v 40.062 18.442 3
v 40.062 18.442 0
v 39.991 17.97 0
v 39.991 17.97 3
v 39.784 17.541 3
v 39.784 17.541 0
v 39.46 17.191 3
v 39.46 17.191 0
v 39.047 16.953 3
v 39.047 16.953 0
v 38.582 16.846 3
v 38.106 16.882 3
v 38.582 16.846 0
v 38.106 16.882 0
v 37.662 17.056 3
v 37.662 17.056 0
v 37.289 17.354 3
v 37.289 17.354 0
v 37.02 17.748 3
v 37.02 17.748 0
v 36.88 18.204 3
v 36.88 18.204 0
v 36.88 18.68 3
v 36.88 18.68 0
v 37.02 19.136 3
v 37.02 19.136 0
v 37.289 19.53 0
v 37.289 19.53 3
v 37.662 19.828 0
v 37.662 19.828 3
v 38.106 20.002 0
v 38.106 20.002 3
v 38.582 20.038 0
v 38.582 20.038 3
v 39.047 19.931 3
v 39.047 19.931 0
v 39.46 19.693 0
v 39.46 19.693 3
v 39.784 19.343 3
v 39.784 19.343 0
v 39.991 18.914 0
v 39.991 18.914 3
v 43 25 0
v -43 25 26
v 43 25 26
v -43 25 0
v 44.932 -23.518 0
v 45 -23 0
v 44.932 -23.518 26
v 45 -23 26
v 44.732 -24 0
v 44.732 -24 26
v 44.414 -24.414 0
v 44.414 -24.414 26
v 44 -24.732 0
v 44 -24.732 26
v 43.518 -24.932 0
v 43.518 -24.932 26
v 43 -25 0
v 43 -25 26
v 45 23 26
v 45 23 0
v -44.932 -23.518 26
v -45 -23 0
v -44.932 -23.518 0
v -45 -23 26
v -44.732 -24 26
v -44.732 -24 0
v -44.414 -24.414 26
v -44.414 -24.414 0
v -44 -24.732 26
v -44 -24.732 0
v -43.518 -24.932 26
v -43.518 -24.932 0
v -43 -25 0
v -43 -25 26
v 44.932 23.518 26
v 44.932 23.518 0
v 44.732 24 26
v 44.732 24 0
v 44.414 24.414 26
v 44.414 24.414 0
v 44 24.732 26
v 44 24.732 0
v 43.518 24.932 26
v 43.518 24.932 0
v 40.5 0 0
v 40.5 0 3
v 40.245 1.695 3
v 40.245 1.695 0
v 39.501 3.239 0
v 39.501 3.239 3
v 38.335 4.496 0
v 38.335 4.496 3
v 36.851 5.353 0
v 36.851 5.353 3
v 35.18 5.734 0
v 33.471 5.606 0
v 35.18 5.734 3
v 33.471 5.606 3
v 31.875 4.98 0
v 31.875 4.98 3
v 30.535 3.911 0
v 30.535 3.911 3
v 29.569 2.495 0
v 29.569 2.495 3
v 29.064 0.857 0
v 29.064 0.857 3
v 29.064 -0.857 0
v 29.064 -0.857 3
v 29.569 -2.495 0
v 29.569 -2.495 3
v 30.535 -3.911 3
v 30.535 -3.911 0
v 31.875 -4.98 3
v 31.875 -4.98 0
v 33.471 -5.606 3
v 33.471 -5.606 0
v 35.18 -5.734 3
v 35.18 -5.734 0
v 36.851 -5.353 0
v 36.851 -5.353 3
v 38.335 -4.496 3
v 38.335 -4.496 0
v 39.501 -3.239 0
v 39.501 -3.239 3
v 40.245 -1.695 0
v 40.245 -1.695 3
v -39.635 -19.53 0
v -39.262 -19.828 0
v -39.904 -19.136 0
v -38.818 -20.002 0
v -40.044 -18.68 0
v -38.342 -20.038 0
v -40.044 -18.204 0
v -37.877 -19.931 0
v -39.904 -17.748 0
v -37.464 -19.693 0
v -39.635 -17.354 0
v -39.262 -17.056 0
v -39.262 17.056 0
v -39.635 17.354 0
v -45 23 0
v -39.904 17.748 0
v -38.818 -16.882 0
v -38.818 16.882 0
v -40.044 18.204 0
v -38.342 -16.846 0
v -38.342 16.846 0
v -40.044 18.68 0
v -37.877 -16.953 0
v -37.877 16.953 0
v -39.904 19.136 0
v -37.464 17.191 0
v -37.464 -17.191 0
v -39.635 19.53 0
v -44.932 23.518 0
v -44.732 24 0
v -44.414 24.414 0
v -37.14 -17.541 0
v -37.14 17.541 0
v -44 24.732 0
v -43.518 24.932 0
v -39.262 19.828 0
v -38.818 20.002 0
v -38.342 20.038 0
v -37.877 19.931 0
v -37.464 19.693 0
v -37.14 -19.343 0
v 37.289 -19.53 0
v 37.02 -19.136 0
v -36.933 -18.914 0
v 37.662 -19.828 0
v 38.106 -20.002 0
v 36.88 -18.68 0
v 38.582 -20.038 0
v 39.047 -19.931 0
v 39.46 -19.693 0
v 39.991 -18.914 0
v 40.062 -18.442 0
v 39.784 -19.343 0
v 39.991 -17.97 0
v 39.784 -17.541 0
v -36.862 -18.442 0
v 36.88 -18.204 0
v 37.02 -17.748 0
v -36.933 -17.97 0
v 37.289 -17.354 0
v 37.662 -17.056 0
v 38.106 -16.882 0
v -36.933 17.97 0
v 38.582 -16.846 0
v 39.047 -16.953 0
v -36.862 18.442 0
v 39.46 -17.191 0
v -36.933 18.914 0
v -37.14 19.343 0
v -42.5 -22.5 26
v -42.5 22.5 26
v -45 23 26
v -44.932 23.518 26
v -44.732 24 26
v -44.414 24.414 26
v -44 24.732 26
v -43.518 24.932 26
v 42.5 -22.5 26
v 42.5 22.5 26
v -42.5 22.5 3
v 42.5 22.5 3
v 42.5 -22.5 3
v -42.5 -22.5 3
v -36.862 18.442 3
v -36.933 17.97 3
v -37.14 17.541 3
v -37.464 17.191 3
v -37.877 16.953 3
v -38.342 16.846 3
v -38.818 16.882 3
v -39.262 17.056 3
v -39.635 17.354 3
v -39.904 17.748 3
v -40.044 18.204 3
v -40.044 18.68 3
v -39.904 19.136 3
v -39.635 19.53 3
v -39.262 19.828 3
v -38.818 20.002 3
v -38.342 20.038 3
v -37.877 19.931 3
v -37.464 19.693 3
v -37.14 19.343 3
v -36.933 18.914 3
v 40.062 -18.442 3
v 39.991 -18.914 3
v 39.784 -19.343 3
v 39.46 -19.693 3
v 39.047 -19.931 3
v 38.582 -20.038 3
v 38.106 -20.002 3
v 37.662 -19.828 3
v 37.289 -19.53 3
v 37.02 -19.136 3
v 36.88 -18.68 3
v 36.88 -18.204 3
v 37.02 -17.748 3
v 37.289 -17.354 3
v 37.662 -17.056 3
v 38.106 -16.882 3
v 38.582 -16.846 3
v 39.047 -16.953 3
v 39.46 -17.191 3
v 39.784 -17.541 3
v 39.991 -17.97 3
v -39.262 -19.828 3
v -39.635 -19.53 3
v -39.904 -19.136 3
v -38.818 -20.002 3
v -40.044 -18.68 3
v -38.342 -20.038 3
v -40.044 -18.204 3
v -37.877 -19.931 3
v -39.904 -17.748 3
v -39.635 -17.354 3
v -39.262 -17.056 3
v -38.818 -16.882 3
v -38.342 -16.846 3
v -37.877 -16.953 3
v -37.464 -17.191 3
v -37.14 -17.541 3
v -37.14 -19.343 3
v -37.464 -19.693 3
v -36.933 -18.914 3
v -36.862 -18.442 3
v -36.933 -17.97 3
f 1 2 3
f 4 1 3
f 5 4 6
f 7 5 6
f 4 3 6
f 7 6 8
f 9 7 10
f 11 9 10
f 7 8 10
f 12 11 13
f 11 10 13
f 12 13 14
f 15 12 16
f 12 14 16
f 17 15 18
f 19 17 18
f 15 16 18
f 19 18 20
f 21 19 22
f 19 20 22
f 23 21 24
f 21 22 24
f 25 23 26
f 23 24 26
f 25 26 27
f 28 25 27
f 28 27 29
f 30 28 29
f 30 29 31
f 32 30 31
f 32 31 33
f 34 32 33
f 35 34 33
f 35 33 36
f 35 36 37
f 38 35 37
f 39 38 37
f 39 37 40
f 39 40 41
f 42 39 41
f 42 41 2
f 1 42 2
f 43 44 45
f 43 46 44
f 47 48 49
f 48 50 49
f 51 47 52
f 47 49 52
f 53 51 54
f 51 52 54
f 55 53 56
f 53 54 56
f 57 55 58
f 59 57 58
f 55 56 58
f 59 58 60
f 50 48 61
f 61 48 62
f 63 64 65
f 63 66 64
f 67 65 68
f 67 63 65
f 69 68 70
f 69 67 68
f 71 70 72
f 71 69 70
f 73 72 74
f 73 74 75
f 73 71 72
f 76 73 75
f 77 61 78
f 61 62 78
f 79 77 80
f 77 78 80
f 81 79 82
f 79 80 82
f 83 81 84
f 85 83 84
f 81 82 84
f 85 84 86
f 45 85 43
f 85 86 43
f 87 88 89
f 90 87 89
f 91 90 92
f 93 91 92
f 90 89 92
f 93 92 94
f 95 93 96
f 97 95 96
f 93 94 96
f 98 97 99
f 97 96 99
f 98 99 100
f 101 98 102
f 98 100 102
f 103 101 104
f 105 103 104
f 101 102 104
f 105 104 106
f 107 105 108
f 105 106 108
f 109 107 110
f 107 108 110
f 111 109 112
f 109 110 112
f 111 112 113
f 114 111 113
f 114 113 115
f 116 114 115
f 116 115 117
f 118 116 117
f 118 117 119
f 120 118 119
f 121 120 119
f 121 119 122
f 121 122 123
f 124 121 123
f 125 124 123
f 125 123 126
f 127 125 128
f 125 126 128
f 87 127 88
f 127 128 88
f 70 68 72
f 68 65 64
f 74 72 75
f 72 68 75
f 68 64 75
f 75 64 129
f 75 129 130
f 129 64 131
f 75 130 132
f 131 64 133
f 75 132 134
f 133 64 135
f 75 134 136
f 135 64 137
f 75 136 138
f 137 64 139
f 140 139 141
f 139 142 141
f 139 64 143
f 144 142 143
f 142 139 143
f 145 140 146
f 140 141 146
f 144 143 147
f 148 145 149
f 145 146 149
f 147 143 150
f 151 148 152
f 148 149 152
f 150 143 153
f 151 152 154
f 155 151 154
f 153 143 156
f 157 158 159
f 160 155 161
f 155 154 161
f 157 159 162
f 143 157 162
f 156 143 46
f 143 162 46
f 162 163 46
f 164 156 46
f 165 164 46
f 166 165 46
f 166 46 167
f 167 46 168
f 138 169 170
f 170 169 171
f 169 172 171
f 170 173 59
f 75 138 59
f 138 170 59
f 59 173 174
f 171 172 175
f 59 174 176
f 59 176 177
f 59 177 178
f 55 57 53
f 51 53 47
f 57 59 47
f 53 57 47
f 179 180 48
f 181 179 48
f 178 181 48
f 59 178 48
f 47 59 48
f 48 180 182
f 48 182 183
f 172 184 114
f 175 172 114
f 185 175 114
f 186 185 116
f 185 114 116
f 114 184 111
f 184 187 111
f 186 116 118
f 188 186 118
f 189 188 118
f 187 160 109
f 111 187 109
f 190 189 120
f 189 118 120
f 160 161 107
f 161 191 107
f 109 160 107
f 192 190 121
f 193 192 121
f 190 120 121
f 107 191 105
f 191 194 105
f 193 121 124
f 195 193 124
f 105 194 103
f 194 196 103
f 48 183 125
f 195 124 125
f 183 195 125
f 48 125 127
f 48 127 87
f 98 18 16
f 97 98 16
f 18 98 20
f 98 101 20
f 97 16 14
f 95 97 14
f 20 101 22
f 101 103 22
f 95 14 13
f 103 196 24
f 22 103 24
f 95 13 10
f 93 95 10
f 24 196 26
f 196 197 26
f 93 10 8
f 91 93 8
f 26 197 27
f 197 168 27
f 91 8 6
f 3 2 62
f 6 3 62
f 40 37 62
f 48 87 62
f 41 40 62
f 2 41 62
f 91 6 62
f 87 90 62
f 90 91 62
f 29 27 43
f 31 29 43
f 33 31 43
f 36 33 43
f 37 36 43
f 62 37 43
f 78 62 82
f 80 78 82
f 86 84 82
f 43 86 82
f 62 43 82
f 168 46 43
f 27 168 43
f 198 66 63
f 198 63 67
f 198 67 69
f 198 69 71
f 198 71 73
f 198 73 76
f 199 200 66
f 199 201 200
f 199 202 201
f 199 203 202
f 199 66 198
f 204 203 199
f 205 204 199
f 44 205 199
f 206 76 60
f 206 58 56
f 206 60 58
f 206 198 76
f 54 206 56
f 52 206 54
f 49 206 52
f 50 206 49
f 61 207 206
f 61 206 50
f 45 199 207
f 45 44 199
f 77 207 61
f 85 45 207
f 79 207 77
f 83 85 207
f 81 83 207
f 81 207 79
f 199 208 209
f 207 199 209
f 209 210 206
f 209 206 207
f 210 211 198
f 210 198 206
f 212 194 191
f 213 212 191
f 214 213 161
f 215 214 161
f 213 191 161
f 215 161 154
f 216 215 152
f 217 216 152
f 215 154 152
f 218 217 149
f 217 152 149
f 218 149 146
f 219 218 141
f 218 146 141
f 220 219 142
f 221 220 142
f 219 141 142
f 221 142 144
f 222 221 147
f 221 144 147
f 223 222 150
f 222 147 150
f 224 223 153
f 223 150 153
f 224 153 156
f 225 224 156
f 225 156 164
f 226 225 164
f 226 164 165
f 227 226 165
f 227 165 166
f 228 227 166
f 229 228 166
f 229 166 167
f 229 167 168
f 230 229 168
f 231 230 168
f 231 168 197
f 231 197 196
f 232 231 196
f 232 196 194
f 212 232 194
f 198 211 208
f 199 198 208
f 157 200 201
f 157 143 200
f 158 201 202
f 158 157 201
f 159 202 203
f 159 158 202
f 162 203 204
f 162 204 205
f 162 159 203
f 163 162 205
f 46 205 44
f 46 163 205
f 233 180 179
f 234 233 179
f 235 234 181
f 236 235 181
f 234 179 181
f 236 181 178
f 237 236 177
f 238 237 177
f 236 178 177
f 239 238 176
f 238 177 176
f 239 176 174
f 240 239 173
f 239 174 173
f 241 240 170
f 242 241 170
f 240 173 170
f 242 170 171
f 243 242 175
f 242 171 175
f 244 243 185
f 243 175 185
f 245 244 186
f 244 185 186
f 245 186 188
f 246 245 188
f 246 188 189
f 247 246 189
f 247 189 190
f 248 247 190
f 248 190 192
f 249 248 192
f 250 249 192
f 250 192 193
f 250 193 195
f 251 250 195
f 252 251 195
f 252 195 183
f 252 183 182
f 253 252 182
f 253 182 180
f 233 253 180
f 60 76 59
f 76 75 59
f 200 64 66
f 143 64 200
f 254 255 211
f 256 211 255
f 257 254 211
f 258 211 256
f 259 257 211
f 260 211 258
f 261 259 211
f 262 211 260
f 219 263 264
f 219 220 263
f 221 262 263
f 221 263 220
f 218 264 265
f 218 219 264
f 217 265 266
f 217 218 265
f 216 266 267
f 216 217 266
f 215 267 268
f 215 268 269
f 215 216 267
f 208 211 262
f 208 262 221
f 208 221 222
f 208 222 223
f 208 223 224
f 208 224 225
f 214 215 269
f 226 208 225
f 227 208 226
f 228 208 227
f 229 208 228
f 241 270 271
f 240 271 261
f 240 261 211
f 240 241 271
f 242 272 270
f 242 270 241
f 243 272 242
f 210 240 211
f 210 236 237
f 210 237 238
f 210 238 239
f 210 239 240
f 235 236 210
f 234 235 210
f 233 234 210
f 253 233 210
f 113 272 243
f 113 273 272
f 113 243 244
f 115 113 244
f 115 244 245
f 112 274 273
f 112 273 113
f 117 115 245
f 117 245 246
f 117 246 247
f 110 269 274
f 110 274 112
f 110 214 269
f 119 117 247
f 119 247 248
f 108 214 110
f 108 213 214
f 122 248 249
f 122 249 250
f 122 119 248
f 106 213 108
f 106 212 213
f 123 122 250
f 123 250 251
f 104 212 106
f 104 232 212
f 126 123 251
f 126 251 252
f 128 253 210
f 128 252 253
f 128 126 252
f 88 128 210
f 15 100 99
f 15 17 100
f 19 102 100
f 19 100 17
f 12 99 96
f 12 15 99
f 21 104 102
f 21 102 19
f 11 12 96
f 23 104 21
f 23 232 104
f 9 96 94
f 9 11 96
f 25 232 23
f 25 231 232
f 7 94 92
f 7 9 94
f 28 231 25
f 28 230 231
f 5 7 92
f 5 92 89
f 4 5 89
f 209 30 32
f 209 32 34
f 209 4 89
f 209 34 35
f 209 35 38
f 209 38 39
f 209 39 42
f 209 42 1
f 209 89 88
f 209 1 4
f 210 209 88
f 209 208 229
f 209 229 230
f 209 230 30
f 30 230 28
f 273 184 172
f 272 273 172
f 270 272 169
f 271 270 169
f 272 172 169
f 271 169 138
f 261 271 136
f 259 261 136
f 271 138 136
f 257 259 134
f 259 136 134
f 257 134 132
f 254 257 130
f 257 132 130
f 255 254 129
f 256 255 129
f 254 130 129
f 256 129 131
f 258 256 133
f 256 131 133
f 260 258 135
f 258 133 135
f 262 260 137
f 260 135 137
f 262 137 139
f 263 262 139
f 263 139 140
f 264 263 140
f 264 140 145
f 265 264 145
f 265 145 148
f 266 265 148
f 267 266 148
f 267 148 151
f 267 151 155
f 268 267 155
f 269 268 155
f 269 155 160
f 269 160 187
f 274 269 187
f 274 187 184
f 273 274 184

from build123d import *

# Parameters (mm, degrees)
F0_W     = 90
F0_H     = 50
F0_W_2   = 85
F0_H_2   = 45
F1_DEPTH = 3
F2_DEPTH = 26
F3_R     = 2
F4_R     = 5.75
F5_DEPTH = 3
F6_R     = 1.6
F7_DEPTH = 25


with BuildPart() as f1:
    # F0 (on Top) → F1 (new body)
    with BuildSketch(Plane.XY):
        Rectangle(F0_W, F0_H)
        Rectangle(F0_W_2, F0_H_2, mode=Mode.SUBTRACT)
        Rectangle(F0_W_2, F0_H_2)
    extrude(amount=F1_DEPTH)

    # F0 (on Top) → F2 (join)
    with BuildSketch(Plane.XY):
        Rectangle(F0_W, F0_H)
        Rectangle(F0_W_2, F0_H_2, mode=Mode.SUBTRACT)
    extrude(amount=F2_DEPTH)

    # F3
    f3_edges = [f1.edges().sort_by_distance(p)[0] for p in [
        (-45, -25, 13),
        (45, -25, 13),
        (-45, 25, 13),
        (45, 25, 13),
    ]]
    fillet(f3_edges, radius=F3_R)

    # F4 (on face) → F5 (cut, through all)
    with BuildSketch(Plane.XY.offset(3)):
        with Locations((34.75, 0)):
            Circle(F4_R)
    extrude(amount=-F5_DEPTH, mode=Mode.SUBTRACT)

    # F6 (on face) → F7 (cut)
    with BuildSketch(Plane(origin=(0, 0, 0), x_dir=(1, 0, 0), z_dir=(0, 0, -1))):
        with Locations((-38.462, -18.442)):
            Circle(F6_R)
        with Locations((-38.462, 18.442)):
            Circle(F6_R)
        with Locations((38.462, 18.442)):
            Circle(F6_R)
        with Locations((38.462, -18.442)):
            Circle(F6_R)
    extrude(amount=-F7_DEPTH, mode=Mode.SUBTRACT)


solid = f1.part
